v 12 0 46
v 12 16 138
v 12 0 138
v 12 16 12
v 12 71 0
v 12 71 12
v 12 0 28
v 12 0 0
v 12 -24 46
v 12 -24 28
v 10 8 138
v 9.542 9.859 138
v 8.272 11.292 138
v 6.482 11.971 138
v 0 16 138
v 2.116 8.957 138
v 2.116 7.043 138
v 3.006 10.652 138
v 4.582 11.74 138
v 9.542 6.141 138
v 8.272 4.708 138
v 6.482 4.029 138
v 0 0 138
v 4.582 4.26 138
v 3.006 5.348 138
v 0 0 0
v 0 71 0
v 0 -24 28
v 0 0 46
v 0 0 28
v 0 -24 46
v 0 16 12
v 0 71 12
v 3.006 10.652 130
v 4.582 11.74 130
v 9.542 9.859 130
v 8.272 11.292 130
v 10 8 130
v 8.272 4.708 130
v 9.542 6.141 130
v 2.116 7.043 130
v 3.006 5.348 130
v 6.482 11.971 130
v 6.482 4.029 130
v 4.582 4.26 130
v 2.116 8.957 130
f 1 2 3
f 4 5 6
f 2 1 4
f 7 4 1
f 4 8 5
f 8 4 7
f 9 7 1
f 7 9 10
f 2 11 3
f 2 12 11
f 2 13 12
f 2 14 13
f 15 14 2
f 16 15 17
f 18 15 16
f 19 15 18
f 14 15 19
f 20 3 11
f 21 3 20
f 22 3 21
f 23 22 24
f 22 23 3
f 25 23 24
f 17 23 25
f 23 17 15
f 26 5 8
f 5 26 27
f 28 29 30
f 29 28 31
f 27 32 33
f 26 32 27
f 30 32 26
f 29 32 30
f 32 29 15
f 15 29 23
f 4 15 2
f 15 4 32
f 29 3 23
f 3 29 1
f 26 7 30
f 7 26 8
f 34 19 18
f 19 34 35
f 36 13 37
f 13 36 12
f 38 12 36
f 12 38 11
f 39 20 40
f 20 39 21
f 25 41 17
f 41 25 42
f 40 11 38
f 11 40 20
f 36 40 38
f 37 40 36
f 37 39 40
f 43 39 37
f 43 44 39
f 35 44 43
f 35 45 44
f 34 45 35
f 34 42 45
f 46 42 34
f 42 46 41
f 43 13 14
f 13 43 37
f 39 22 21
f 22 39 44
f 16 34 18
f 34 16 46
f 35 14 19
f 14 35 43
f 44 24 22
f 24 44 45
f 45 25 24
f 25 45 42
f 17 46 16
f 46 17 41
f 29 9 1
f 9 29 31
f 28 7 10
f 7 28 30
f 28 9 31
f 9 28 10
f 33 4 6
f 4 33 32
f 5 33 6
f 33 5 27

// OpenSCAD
thickness = 12;
width = 16;
height = 138;

difference() {
    cube([thickness, width, height], false);
    translate([(thickness / 2), (width / 2), 130]) cylinder(thickness, (thickness / 3), (thickness / 3), false);
}

smBranchWidth = 24;

translate([0, (smBranchWidth * -1), 28])
    cube([thickness, smBranchWidth, 18], false);

translate([0, 16, 0])
    cube([thickness, 55, 12], false);
